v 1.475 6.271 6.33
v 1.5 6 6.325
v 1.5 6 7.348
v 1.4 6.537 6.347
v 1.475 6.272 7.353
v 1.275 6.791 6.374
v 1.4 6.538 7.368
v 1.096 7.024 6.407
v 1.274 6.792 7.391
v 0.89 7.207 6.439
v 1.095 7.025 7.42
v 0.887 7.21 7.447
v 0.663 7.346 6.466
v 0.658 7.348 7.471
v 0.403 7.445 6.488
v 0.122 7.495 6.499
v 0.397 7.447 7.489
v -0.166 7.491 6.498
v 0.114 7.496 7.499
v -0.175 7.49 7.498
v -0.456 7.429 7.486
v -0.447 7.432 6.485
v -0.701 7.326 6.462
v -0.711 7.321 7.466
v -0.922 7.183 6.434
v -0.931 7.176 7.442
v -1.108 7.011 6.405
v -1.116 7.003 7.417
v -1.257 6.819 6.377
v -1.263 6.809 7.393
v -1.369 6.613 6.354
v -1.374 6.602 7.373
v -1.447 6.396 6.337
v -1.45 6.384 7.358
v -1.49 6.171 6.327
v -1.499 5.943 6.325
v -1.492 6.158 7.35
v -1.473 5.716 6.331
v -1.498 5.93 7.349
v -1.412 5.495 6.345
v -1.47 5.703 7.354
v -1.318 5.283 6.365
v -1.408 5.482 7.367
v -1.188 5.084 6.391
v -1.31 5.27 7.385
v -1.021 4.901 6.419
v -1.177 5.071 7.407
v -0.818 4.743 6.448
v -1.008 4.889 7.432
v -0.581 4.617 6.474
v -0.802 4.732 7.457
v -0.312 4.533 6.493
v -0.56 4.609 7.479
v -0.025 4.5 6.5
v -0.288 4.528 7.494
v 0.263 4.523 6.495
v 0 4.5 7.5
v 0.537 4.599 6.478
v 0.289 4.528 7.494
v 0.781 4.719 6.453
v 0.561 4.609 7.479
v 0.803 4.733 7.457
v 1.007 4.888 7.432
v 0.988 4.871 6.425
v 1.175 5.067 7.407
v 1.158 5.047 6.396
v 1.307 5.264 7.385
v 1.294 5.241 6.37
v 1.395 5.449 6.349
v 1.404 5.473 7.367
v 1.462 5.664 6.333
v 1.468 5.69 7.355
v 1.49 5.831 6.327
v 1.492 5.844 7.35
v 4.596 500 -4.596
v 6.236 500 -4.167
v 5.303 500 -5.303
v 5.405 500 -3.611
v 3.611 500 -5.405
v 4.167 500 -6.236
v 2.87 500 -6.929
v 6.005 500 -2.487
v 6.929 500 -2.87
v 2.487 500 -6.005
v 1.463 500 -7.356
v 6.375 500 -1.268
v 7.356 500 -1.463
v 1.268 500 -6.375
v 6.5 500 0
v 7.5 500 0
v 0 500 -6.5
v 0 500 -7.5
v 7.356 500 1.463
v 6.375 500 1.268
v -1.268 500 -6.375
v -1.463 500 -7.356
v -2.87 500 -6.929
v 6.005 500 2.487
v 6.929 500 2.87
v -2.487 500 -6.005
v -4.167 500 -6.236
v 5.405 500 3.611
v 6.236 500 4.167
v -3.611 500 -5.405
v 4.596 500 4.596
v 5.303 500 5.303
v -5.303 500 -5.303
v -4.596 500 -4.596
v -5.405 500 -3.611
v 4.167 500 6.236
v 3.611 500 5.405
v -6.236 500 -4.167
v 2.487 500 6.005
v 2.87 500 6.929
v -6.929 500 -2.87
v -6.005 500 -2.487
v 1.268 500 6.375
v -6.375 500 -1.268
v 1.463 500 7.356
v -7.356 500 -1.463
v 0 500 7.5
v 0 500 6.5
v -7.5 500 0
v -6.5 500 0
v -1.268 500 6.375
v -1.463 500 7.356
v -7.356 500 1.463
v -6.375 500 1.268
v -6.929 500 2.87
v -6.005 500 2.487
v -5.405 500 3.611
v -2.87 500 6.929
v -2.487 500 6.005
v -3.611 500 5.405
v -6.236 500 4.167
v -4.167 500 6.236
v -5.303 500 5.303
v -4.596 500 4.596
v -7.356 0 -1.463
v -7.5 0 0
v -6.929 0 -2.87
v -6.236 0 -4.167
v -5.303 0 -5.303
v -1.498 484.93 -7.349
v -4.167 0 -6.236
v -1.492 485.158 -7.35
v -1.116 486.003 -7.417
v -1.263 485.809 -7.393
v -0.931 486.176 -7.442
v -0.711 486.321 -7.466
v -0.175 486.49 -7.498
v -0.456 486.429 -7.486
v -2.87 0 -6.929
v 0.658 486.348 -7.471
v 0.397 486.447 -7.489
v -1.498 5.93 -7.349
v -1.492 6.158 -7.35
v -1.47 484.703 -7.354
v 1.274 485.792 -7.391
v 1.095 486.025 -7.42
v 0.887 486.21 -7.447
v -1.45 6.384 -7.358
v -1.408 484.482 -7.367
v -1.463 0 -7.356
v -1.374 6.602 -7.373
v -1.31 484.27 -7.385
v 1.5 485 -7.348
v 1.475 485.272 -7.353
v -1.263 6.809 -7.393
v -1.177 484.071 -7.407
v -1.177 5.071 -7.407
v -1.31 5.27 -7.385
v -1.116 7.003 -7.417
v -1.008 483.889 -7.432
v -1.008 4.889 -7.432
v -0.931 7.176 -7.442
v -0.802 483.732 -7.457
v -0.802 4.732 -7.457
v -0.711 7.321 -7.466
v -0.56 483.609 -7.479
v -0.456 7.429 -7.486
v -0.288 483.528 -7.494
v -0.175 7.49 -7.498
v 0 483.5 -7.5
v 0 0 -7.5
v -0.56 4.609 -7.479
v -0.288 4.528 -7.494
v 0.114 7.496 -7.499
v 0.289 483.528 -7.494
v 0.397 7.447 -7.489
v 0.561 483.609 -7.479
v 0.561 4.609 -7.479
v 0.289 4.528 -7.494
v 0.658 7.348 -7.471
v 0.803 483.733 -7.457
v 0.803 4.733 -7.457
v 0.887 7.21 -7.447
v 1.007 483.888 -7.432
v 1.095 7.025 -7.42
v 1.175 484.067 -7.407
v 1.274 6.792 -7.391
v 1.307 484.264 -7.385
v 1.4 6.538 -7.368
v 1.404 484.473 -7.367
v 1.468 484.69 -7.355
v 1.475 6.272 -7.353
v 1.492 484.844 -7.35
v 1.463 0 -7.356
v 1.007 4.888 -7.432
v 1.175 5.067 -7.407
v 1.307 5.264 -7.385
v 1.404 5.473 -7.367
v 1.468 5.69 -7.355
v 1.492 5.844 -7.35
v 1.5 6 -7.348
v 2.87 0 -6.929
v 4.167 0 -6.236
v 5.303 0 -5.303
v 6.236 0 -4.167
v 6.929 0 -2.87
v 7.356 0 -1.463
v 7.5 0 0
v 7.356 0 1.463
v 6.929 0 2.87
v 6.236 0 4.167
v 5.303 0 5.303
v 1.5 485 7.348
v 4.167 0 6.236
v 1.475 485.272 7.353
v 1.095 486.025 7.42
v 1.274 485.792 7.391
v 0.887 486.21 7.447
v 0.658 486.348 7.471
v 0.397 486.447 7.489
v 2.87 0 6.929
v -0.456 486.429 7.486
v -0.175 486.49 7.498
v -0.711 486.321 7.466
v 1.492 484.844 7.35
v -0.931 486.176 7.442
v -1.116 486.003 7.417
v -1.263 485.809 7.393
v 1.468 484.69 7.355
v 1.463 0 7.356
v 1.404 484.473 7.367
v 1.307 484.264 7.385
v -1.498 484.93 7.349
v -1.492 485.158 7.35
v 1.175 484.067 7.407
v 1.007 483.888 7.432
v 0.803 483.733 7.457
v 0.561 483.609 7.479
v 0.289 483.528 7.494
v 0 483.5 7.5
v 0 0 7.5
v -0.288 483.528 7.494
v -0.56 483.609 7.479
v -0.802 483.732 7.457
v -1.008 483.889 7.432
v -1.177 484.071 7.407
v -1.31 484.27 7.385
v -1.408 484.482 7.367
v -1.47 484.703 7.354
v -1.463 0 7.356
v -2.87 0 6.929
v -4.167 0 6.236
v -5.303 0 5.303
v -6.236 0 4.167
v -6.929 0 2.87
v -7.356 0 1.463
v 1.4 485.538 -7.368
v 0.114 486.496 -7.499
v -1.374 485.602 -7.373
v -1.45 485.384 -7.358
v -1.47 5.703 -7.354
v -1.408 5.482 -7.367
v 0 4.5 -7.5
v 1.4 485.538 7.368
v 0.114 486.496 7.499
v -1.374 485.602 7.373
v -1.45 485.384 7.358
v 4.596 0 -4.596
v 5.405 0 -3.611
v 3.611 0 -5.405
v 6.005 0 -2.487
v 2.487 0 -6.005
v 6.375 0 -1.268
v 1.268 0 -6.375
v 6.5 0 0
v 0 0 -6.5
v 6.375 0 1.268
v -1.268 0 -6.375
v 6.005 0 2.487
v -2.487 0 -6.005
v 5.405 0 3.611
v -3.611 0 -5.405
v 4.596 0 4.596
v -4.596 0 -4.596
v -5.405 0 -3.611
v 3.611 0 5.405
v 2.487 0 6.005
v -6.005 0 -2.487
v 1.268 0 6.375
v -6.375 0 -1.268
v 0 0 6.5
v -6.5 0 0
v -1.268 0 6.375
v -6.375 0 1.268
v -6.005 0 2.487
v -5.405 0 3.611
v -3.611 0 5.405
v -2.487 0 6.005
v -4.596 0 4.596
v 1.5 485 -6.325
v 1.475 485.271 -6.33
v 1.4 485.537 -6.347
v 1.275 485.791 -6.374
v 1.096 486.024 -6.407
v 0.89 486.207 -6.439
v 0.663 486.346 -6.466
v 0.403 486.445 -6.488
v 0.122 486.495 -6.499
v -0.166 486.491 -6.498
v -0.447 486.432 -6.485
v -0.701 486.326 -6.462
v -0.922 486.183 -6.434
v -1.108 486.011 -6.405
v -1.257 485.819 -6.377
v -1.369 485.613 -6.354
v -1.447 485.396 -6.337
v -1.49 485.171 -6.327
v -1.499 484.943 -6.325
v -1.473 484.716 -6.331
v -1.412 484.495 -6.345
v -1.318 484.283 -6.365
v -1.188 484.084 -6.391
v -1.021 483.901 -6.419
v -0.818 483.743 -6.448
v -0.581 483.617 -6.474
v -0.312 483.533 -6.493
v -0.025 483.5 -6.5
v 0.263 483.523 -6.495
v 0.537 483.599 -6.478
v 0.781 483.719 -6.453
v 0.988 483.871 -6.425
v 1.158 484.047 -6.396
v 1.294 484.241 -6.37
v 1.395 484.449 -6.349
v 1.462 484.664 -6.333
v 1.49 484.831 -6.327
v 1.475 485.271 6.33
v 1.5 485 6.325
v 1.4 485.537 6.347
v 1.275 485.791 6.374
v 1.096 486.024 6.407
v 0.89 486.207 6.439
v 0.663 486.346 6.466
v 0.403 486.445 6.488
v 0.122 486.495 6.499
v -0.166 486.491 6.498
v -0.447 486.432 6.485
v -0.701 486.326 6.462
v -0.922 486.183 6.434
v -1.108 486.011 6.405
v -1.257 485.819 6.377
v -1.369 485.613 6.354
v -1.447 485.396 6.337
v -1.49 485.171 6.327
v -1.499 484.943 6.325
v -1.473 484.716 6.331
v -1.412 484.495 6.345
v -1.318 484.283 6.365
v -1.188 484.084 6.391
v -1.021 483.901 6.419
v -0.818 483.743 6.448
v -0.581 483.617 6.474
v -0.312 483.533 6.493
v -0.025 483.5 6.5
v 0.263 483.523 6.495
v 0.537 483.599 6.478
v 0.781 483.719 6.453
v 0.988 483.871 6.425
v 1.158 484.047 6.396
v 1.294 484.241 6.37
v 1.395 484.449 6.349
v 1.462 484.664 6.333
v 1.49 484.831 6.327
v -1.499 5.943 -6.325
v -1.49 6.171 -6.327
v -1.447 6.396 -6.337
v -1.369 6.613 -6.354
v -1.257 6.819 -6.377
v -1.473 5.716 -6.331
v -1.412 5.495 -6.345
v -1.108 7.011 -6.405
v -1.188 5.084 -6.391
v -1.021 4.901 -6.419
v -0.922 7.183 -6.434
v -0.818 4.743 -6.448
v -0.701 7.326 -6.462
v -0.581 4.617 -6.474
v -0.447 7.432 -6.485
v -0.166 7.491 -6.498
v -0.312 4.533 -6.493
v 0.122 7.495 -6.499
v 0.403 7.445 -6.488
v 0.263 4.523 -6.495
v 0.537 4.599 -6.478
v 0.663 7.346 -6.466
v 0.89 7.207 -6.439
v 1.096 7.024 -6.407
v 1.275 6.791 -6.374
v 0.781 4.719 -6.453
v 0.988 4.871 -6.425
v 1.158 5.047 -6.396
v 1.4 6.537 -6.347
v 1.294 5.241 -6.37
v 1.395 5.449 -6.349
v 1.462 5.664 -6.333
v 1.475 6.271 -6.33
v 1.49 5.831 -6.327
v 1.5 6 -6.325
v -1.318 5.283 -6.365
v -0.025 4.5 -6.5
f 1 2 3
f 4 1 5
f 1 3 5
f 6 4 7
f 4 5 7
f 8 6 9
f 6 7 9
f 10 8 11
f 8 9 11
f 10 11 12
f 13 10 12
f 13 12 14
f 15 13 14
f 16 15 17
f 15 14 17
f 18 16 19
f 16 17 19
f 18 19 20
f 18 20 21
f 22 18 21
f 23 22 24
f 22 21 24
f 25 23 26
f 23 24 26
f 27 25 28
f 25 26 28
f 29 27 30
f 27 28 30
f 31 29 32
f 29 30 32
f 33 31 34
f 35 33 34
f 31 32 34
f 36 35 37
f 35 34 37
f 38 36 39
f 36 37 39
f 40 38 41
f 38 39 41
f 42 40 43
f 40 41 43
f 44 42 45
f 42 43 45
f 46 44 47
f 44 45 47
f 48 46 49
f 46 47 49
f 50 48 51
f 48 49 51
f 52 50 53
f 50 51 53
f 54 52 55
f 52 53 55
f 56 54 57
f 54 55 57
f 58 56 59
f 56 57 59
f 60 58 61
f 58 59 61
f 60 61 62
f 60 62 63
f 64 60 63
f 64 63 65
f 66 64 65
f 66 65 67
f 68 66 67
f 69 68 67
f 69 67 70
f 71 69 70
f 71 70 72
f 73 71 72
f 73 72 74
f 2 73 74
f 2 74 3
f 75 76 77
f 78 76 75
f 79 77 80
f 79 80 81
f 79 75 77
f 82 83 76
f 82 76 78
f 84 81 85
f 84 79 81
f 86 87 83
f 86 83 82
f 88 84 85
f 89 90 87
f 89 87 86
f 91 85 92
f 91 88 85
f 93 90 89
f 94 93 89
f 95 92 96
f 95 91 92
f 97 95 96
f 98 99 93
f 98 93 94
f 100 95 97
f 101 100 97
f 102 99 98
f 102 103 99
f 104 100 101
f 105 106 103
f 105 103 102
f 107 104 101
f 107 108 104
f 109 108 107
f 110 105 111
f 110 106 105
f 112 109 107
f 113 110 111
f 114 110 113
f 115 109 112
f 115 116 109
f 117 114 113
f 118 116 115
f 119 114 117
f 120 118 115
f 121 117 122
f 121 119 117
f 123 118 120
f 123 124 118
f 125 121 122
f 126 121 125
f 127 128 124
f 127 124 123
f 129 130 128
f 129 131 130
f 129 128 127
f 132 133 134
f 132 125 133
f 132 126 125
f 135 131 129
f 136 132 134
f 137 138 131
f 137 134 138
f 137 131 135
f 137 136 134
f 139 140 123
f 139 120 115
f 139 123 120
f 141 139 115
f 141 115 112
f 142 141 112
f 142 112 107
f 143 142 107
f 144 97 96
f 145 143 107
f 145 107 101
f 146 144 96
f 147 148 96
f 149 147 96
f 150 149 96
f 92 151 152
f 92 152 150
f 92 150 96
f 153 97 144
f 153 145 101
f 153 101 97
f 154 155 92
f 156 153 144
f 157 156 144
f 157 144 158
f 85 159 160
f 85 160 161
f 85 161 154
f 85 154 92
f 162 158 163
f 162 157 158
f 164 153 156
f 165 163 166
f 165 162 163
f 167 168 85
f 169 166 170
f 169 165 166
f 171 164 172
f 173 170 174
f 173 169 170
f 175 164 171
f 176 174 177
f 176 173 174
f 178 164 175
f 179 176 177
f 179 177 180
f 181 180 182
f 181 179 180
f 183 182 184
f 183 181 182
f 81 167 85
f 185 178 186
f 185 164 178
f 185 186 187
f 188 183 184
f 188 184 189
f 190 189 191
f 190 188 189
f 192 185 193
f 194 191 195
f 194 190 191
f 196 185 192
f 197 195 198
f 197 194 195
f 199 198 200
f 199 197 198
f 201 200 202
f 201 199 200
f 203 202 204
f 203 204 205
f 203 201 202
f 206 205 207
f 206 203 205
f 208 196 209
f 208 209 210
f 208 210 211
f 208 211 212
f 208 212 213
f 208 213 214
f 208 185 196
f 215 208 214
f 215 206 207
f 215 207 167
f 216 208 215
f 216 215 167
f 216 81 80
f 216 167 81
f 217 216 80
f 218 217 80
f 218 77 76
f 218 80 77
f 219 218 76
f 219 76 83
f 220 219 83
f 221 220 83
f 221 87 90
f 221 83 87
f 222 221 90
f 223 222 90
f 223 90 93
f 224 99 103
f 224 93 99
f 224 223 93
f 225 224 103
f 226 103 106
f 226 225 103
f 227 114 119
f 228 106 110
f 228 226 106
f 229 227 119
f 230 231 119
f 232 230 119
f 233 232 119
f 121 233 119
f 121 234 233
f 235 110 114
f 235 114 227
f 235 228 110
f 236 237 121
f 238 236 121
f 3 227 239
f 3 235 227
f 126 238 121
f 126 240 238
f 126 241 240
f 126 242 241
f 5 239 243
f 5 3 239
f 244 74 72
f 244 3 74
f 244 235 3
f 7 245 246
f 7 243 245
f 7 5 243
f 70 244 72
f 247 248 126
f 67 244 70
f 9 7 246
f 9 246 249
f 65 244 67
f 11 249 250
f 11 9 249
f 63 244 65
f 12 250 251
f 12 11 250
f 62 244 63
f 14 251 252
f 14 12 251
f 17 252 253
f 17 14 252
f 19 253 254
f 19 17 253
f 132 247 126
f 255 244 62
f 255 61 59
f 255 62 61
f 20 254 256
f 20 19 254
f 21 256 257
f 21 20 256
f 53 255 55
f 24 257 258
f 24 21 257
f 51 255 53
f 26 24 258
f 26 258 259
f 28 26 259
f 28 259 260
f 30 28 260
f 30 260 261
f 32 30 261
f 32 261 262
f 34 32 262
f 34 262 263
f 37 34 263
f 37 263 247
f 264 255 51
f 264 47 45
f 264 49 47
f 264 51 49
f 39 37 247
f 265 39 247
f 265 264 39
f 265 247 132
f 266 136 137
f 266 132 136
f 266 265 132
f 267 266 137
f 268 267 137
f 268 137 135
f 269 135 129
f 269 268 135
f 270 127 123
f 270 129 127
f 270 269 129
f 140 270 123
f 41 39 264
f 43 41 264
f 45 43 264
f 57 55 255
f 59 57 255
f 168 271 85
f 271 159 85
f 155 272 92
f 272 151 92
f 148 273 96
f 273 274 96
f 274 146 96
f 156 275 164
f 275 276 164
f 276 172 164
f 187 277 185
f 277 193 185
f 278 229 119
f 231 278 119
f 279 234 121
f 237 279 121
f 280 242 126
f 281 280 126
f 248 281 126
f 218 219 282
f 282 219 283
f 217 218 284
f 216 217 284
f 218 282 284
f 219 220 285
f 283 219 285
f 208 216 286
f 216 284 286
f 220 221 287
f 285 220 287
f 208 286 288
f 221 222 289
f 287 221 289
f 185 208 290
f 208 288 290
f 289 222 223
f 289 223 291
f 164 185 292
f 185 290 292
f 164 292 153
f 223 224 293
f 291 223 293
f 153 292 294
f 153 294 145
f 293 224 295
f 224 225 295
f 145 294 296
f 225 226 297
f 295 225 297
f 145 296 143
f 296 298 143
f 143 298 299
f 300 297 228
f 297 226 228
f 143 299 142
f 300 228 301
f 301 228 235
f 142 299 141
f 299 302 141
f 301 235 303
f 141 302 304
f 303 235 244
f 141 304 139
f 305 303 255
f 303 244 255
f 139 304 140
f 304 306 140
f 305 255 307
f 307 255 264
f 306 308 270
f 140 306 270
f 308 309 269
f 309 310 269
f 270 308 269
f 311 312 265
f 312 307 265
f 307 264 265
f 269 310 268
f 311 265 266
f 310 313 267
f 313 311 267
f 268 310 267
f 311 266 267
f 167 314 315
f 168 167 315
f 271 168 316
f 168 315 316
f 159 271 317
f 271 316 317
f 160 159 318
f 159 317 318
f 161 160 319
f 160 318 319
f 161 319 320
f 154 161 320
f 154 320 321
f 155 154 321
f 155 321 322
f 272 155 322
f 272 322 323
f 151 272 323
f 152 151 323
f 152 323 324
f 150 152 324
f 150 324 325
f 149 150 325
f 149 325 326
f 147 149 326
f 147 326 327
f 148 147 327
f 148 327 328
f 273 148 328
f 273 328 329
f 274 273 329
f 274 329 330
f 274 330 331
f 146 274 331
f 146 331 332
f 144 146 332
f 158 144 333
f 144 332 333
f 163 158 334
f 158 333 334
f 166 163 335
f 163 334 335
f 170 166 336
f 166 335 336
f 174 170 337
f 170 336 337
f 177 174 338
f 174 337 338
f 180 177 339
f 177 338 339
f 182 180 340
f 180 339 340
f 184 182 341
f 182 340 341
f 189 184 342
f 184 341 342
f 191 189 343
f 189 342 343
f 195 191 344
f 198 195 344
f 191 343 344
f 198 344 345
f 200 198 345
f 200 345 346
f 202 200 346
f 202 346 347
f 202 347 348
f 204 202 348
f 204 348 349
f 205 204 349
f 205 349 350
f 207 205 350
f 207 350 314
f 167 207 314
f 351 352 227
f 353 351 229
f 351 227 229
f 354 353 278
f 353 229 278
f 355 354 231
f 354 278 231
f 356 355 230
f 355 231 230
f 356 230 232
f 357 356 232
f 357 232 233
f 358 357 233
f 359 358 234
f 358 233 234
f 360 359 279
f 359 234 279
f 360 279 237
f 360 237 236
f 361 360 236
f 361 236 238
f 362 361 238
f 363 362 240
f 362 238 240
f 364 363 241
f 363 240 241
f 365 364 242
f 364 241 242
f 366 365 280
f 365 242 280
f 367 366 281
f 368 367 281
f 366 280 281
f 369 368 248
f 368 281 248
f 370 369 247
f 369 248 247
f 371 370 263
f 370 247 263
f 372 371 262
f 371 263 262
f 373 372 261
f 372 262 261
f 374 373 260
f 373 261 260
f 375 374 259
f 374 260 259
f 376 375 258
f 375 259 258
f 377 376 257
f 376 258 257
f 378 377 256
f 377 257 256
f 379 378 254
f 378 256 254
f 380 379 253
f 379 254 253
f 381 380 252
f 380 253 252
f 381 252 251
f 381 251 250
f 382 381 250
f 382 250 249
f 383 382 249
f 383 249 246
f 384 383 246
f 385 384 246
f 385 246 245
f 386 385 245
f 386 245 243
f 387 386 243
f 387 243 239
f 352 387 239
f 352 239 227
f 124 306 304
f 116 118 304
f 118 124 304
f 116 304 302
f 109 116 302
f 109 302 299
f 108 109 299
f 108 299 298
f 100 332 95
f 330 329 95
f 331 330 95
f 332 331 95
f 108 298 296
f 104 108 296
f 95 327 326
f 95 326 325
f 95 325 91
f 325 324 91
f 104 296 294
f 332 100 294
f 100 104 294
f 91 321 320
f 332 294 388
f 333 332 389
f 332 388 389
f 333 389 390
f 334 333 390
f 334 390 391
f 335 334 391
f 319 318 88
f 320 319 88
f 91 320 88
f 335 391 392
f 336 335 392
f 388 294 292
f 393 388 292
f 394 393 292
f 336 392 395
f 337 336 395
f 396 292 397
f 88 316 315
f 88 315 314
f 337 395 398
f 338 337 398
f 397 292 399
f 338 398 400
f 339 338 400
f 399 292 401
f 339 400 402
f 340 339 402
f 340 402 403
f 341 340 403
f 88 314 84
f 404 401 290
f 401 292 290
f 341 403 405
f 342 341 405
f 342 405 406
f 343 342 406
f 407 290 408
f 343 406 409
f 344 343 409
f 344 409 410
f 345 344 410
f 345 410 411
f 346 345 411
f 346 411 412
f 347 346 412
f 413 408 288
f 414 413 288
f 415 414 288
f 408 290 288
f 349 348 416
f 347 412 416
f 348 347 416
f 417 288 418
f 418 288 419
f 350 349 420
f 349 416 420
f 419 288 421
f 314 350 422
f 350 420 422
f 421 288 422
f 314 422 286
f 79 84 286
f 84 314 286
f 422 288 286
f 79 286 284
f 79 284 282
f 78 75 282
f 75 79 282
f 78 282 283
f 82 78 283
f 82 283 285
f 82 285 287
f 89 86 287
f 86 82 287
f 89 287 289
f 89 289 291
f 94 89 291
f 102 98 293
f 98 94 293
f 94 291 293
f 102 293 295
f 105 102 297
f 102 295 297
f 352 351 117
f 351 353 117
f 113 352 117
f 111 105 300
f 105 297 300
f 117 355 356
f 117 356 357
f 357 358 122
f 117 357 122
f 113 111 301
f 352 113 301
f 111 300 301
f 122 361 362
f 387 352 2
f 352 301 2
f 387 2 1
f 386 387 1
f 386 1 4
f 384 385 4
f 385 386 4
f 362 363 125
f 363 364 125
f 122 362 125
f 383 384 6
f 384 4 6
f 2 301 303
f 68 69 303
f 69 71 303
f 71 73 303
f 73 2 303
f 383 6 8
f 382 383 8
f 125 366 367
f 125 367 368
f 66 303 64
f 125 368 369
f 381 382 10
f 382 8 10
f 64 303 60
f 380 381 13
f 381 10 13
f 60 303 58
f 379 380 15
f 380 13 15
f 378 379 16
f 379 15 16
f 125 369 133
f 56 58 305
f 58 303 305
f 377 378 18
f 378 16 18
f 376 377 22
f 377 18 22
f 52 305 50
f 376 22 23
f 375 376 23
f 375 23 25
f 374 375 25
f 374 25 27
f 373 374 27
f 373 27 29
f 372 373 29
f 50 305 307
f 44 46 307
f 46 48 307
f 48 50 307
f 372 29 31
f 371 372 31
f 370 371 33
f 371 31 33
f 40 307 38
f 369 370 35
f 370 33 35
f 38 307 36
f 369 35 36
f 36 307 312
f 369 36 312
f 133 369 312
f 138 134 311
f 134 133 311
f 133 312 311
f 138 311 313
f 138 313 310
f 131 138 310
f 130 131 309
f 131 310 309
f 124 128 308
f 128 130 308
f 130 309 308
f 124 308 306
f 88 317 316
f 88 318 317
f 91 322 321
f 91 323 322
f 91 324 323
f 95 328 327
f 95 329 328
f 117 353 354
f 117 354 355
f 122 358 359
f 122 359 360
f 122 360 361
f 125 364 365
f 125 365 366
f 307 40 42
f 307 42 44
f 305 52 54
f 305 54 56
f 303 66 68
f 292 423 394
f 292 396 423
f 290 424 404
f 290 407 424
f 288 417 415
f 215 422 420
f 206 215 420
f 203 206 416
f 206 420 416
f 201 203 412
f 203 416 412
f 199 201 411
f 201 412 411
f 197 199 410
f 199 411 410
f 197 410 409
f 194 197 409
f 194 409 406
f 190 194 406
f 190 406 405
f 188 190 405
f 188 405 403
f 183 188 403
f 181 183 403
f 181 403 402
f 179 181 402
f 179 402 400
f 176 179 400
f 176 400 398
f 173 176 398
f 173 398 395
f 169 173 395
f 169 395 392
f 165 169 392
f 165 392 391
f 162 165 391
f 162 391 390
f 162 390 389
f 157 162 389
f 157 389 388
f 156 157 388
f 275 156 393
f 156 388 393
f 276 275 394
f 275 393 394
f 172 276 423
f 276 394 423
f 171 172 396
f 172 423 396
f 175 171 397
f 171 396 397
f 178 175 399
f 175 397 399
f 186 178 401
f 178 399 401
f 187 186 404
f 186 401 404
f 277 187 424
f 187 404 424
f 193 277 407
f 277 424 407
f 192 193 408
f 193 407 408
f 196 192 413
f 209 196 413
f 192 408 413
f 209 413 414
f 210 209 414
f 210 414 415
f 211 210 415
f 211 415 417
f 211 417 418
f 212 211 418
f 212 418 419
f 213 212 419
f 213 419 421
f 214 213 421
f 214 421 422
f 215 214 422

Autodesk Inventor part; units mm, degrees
ref_plane "YZ Plane" through (0, 0, 0) normal (1, 0, 0) x (0, 1, 0)
ref_plane "XZ Plane" through (0, 0, 0) normal (0, 1, 0) x (-1, 0, 0)
ref_plane "XY Plane" through (0, 0, 0) normal (0, 0, 1) x (1, 0, 0)
sketch "Sketch2" plane through (0, 0, 0) normal (0, 1, 0) x (-1, 0, 0)
  circle A0 centre (0, 0) radius 7.5
  circle A1 centre (0, 0) radius 6.5
  dimension "d91" = 15
  dimension "d92" = 13
extrude "Extrusion5" add sketch "Sketch2" along normal blind 500
sketch "Sketch3" plane through (0, 0, 0) normal (0, 0, 1) x (1, 0, 0)
  line L0 (0, 0) -> (0, 6)
  circle A0 centre (0, 6) radius 1.5
  line L1 (7.5, 500) -> (-7.5, 500) projected
  line L2 (0, 500) -> (0, 485)
  circle A1 centre (0, 485) radius 1.5
  dimension "d95" = 6
  dimension "d96" = 3
  dimension "d101" = 15
  dimension "d102" = 3
extrude "Extrusion6" cut sketch "Sketch3" along normal blind 20 and the other way blind 10
properties part number "airfoil"
